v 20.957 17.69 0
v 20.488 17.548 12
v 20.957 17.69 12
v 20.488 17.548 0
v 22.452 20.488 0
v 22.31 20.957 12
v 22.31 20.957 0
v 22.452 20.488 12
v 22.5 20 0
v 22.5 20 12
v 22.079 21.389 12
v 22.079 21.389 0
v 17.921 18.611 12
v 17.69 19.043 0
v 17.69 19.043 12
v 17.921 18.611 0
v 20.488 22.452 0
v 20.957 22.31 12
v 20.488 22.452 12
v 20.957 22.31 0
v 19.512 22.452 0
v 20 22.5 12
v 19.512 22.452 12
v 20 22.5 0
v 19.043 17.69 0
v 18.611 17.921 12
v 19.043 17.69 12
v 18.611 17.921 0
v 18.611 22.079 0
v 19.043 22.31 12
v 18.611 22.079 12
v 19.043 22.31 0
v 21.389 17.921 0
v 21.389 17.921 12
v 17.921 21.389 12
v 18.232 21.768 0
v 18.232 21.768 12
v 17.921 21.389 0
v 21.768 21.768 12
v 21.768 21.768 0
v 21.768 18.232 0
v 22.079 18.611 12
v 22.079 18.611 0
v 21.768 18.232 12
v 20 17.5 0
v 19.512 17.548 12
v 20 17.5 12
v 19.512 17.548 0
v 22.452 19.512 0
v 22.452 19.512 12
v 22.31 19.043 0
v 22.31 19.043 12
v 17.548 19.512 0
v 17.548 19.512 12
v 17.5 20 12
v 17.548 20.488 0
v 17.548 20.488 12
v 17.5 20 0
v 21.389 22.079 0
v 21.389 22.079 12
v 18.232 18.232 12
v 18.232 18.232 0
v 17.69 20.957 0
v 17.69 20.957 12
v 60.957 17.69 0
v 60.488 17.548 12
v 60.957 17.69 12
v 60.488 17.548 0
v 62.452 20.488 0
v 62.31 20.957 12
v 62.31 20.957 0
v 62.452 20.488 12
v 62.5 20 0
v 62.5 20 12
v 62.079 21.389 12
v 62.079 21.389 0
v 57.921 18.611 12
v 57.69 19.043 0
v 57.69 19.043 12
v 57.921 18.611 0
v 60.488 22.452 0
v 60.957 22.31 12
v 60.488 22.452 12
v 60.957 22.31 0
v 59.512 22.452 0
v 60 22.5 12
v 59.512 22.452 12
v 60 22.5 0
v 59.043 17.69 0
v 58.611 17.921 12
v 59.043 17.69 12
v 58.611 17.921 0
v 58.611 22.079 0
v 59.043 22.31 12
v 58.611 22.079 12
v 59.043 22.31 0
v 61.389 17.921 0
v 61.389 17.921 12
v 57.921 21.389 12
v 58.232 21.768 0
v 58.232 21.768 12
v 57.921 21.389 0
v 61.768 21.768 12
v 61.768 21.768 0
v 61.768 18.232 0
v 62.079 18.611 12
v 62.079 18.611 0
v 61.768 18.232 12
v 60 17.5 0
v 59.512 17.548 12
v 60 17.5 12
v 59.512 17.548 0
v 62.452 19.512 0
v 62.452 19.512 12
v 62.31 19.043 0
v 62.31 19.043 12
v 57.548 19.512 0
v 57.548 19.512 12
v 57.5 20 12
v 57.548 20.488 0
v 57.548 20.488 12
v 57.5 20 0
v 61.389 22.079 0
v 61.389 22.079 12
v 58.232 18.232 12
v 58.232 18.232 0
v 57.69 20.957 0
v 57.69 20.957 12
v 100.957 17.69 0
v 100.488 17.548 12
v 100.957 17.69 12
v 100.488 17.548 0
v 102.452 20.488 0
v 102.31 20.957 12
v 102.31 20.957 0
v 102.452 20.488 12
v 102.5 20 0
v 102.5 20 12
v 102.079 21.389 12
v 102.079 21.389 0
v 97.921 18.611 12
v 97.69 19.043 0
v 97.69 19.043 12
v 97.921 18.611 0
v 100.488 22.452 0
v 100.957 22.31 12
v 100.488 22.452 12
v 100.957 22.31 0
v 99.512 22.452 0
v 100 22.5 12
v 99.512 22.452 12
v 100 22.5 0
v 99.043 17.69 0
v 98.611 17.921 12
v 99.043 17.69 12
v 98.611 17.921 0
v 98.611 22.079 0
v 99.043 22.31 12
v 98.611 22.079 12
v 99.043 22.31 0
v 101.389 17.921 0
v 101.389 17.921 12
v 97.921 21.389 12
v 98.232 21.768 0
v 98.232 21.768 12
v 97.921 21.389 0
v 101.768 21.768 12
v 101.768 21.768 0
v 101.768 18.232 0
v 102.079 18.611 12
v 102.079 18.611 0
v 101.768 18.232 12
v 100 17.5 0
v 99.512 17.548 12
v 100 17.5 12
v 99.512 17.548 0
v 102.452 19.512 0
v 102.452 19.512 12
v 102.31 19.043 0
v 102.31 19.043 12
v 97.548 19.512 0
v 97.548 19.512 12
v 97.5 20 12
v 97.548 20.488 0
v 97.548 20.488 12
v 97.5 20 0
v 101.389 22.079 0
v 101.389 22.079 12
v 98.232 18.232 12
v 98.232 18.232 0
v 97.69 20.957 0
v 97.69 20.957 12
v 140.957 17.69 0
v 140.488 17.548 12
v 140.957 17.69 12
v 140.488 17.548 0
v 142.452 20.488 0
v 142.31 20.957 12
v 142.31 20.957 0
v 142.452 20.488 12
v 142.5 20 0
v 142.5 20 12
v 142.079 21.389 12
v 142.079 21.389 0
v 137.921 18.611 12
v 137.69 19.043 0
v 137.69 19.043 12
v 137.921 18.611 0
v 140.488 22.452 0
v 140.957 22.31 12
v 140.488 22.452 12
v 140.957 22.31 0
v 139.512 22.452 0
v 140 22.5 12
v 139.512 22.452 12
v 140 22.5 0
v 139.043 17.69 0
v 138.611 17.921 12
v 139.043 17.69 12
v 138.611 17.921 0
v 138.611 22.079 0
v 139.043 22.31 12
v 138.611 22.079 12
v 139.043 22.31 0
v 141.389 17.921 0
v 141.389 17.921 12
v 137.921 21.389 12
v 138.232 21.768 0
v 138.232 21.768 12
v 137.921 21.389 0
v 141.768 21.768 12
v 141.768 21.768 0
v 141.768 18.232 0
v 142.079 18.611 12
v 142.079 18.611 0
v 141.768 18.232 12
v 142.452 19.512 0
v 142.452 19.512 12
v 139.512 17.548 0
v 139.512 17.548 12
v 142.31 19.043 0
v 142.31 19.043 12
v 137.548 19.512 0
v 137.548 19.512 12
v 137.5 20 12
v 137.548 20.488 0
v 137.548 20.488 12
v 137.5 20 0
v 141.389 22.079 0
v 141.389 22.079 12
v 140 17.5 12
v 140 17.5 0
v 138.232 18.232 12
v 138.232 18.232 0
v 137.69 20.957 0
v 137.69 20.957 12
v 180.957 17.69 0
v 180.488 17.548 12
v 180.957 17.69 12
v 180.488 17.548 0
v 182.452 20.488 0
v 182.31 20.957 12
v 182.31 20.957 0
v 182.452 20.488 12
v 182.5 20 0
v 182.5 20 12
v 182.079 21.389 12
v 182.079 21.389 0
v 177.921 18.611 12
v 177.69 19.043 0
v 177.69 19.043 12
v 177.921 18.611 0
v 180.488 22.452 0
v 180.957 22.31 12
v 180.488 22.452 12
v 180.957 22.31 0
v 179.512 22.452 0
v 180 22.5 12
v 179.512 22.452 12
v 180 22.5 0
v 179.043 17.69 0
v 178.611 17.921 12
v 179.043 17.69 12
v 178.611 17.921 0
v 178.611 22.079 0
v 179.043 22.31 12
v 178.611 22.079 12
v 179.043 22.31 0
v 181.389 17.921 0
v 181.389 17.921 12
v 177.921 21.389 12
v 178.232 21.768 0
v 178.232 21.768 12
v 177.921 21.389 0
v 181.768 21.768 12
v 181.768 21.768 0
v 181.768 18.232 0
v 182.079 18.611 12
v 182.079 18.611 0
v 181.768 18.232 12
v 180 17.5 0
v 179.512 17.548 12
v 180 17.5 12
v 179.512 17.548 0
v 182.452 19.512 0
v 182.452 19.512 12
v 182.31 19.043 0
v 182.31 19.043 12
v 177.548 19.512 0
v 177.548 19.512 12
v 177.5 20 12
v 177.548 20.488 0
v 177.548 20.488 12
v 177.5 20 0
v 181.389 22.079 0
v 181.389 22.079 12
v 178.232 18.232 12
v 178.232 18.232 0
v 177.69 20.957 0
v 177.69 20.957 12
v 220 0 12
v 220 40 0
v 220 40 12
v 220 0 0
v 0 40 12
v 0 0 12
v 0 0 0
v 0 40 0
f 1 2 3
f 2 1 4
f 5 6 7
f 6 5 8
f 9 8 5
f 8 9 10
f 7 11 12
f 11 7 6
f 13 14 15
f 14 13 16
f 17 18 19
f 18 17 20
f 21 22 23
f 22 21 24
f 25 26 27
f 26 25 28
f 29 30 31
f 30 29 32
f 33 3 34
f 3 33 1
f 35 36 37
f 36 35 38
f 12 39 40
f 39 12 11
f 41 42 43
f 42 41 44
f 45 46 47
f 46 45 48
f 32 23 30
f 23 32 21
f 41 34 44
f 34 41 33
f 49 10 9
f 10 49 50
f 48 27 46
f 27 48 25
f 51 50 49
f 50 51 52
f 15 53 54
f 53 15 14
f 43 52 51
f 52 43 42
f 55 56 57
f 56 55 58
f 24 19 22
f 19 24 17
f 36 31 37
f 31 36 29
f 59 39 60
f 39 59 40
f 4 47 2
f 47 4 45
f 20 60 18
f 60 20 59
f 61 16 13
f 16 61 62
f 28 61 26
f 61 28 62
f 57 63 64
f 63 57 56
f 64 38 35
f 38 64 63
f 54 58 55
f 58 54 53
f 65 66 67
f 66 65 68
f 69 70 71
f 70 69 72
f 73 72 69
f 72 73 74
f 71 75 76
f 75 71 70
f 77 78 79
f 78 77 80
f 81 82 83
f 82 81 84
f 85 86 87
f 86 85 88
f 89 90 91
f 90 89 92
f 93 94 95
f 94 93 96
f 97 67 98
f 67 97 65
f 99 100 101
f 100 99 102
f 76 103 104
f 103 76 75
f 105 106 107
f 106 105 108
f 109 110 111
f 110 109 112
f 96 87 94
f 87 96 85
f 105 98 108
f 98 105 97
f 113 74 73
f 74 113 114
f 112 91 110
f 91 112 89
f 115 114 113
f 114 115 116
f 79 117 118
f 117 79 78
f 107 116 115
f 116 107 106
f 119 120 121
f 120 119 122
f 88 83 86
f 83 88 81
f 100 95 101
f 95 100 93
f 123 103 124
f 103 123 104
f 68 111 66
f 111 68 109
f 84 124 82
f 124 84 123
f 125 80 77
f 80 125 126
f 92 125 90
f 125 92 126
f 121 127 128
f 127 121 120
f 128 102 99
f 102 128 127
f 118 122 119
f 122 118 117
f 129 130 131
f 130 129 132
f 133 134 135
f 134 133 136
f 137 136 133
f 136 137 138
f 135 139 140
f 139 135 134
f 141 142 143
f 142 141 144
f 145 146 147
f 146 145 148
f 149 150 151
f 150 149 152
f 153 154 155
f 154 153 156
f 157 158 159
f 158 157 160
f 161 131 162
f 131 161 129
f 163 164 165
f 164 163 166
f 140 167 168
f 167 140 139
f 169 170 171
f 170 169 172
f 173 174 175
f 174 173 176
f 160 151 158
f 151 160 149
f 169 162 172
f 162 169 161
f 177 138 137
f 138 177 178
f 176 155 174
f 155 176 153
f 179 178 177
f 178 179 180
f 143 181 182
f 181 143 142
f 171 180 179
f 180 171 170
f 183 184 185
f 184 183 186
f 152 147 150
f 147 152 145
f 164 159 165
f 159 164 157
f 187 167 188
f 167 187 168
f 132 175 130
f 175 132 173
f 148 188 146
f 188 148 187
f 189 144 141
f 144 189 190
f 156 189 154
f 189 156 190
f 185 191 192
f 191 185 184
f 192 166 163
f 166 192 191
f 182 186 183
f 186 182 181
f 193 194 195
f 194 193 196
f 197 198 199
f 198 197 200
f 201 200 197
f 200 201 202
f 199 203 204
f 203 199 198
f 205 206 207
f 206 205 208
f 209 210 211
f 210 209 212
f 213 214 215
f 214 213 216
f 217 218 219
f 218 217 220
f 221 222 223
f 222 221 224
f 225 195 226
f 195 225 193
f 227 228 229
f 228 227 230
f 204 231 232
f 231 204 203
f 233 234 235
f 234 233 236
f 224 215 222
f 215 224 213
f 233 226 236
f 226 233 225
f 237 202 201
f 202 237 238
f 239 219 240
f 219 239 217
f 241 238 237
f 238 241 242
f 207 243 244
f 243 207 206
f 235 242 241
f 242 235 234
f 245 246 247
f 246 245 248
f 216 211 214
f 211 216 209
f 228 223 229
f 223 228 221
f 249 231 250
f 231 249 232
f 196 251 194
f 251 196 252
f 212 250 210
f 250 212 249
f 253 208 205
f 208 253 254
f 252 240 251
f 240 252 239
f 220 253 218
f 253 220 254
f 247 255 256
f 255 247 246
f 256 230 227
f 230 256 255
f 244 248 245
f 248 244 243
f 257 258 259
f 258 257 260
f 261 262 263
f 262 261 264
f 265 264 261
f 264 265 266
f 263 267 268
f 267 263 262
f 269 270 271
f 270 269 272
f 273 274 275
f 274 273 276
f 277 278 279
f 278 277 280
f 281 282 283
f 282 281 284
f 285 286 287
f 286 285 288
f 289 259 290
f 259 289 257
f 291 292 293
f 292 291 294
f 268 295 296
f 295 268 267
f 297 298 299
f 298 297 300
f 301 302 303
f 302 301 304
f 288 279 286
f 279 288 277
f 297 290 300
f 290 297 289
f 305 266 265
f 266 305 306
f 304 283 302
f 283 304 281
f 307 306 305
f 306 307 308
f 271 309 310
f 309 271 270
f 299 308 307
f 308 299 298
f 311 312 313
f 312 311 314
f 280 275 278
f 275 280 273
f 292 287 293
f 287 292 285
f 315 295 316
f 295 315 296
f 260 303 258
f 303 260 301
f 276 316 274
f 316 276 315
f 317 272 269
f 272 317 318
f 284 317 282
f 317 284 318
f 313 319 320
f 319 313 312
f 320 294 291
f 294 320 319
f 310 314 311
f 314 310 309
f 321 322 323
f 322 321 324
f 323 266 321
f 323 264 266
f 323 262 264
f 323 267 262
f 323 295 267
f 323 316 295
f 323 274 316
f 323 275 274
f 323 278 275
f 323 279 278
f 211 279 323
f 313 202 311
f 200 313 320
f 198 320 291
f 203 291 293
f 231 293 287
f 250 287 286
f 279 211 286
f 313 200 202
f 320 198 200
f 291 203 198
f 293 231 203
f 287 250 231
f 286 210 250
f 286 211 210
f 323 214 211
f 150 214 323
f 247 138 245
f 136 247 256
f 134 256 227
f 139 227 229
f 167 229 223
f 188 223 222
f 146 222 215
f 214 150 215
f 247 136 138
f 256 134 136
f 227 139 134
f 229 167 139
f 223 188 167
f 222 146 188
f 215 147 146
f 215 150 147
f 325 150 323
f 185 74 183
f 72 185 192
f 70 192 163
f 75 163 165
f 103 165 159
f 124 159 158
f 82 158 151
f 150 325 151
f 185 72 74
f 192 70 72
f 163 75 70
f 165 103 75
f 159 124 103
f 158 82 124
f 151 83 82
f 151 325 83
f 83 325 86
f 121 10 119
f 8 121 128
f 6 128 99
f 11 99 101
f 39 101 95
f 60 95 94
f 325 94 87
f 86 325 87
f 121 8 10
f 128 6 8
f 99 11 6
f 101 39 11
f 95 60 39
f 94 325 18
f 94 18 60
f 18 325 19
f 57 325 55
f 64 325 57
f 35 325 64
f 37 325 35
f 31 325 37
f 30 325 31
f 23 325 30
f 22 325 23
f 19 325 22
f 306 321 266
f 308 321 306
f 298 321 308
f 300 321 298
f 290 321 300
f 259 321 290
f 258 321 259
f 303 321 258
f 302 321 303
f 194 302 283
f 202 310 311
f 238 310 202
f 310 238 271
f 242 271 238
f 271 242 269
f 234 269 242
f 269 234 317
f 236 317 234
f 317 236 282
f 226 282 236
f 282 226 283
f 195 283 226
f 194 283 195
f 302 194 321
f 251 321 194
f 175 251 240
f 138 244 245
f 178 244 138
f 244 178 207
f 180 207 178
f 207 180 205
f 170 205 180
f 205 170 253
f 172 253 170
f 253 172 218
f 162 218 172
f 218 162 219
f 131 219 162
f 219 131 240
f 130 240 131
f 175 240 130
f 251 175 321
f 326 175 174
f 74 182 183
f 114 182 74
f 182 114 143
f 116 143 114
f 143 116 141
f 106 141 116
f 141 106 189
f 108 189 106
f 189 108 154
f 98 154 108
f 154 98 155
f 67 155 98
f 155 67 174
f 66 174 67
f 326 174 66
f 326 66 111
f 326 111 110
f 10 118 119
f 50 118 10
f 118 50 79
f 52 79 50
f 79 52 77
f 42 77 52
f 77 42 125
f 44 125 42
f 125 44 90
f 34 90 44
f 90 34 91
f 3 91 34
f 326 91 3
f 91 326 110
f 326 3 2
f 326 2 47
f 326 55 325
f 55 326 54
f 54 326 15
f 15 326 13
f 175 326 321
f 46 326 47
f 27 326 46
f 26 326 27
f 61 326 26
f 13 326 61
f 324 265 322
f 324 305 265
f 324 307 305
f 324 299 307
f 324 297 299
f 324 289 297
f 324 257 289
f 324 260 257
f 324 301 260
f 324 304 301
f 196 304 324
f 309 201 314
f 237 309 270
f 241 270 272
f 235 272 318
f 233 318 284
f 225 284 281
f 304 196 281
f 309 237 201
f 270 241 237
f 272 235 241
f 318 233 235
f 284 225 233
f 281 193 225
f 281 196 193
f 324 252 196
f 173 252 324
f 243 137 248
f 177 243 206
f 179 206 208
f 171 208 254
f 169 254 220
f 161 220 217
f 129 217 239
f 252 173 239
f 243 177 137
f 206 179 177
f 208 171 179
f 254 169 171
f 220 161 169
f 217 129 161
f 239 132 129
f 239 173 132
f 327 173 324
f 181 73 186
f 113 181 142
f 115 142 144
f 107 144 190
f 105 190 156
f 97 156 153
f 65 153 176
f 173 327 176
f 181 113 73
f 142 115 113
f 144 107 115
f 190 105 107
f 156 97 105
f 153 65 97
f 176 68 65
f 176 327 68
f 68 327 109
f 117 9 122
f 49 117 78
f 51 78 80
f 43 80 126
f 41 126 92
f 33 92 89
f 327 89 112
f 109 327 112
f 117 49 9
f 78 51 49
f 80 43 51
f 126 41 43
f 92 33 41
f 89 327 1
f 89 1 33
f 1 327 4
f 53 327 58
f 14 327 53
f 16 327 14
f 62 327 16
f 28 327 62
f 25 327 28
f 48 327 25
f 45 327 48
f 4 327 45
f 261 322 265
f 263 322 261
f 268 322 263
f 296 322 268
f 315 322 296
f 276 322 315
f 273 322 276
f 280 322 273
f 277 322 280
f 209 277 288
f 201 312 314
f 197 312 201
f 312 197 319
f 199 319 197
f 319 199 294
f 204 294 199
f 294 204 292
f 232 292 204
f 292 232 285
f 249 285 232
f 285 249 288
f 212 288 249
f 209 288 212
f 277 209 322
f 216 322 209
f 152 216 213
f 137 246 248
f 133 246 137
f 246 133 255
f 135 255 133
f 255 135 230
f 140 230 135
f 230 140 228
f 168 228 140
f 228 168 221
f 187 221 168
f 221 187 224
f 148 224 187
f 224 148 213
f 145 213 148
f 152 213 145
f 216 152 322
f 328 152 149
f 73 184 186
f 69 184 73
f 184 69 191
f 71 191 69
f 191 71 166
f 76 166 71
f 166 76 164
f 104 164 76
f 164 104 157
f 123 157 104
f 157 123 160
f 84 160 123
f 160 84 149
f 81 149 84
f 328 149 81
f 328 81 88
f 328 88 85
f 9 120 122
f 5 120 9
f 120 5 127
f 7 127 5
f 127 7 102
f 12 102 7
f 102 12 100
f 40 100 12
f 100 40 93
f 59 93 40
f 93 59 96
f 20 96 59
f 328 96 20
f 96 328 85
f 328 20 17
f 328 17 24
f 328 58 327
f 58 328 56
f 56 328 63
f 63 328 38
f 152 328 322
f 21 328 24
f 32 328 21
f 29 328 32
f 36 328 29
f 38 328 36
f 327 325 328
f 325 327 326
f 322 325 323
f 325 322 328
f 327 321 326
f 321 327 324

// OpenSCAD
$fn = 32;

// ----------------------------------------------------------------------
// Long rail: 200-250 mm mounting rail
// ----------------------------------------------------------------------

// --- parameters (mm) ---
rail_l = 220;             // rail length, X
rail_w = 40;              // rail width, Y
rail_t = 12;              // rail thickness, Z
hole_d = 5;               // mounting hole diameter
hole_start = 20;          // first hole offset from the end
hole_pitch = 40;          // hole pitch
holes = 5;                // number of holes

difference() {
  cube([rail_l, rail_w, rail_t]);
  for (i = [0 : holes - 1])
    translate([hole_start + i * hole_pitch, rail_w / 2, -1])
      cylinder(h = rail_t + 2, d = hole_d);
}
